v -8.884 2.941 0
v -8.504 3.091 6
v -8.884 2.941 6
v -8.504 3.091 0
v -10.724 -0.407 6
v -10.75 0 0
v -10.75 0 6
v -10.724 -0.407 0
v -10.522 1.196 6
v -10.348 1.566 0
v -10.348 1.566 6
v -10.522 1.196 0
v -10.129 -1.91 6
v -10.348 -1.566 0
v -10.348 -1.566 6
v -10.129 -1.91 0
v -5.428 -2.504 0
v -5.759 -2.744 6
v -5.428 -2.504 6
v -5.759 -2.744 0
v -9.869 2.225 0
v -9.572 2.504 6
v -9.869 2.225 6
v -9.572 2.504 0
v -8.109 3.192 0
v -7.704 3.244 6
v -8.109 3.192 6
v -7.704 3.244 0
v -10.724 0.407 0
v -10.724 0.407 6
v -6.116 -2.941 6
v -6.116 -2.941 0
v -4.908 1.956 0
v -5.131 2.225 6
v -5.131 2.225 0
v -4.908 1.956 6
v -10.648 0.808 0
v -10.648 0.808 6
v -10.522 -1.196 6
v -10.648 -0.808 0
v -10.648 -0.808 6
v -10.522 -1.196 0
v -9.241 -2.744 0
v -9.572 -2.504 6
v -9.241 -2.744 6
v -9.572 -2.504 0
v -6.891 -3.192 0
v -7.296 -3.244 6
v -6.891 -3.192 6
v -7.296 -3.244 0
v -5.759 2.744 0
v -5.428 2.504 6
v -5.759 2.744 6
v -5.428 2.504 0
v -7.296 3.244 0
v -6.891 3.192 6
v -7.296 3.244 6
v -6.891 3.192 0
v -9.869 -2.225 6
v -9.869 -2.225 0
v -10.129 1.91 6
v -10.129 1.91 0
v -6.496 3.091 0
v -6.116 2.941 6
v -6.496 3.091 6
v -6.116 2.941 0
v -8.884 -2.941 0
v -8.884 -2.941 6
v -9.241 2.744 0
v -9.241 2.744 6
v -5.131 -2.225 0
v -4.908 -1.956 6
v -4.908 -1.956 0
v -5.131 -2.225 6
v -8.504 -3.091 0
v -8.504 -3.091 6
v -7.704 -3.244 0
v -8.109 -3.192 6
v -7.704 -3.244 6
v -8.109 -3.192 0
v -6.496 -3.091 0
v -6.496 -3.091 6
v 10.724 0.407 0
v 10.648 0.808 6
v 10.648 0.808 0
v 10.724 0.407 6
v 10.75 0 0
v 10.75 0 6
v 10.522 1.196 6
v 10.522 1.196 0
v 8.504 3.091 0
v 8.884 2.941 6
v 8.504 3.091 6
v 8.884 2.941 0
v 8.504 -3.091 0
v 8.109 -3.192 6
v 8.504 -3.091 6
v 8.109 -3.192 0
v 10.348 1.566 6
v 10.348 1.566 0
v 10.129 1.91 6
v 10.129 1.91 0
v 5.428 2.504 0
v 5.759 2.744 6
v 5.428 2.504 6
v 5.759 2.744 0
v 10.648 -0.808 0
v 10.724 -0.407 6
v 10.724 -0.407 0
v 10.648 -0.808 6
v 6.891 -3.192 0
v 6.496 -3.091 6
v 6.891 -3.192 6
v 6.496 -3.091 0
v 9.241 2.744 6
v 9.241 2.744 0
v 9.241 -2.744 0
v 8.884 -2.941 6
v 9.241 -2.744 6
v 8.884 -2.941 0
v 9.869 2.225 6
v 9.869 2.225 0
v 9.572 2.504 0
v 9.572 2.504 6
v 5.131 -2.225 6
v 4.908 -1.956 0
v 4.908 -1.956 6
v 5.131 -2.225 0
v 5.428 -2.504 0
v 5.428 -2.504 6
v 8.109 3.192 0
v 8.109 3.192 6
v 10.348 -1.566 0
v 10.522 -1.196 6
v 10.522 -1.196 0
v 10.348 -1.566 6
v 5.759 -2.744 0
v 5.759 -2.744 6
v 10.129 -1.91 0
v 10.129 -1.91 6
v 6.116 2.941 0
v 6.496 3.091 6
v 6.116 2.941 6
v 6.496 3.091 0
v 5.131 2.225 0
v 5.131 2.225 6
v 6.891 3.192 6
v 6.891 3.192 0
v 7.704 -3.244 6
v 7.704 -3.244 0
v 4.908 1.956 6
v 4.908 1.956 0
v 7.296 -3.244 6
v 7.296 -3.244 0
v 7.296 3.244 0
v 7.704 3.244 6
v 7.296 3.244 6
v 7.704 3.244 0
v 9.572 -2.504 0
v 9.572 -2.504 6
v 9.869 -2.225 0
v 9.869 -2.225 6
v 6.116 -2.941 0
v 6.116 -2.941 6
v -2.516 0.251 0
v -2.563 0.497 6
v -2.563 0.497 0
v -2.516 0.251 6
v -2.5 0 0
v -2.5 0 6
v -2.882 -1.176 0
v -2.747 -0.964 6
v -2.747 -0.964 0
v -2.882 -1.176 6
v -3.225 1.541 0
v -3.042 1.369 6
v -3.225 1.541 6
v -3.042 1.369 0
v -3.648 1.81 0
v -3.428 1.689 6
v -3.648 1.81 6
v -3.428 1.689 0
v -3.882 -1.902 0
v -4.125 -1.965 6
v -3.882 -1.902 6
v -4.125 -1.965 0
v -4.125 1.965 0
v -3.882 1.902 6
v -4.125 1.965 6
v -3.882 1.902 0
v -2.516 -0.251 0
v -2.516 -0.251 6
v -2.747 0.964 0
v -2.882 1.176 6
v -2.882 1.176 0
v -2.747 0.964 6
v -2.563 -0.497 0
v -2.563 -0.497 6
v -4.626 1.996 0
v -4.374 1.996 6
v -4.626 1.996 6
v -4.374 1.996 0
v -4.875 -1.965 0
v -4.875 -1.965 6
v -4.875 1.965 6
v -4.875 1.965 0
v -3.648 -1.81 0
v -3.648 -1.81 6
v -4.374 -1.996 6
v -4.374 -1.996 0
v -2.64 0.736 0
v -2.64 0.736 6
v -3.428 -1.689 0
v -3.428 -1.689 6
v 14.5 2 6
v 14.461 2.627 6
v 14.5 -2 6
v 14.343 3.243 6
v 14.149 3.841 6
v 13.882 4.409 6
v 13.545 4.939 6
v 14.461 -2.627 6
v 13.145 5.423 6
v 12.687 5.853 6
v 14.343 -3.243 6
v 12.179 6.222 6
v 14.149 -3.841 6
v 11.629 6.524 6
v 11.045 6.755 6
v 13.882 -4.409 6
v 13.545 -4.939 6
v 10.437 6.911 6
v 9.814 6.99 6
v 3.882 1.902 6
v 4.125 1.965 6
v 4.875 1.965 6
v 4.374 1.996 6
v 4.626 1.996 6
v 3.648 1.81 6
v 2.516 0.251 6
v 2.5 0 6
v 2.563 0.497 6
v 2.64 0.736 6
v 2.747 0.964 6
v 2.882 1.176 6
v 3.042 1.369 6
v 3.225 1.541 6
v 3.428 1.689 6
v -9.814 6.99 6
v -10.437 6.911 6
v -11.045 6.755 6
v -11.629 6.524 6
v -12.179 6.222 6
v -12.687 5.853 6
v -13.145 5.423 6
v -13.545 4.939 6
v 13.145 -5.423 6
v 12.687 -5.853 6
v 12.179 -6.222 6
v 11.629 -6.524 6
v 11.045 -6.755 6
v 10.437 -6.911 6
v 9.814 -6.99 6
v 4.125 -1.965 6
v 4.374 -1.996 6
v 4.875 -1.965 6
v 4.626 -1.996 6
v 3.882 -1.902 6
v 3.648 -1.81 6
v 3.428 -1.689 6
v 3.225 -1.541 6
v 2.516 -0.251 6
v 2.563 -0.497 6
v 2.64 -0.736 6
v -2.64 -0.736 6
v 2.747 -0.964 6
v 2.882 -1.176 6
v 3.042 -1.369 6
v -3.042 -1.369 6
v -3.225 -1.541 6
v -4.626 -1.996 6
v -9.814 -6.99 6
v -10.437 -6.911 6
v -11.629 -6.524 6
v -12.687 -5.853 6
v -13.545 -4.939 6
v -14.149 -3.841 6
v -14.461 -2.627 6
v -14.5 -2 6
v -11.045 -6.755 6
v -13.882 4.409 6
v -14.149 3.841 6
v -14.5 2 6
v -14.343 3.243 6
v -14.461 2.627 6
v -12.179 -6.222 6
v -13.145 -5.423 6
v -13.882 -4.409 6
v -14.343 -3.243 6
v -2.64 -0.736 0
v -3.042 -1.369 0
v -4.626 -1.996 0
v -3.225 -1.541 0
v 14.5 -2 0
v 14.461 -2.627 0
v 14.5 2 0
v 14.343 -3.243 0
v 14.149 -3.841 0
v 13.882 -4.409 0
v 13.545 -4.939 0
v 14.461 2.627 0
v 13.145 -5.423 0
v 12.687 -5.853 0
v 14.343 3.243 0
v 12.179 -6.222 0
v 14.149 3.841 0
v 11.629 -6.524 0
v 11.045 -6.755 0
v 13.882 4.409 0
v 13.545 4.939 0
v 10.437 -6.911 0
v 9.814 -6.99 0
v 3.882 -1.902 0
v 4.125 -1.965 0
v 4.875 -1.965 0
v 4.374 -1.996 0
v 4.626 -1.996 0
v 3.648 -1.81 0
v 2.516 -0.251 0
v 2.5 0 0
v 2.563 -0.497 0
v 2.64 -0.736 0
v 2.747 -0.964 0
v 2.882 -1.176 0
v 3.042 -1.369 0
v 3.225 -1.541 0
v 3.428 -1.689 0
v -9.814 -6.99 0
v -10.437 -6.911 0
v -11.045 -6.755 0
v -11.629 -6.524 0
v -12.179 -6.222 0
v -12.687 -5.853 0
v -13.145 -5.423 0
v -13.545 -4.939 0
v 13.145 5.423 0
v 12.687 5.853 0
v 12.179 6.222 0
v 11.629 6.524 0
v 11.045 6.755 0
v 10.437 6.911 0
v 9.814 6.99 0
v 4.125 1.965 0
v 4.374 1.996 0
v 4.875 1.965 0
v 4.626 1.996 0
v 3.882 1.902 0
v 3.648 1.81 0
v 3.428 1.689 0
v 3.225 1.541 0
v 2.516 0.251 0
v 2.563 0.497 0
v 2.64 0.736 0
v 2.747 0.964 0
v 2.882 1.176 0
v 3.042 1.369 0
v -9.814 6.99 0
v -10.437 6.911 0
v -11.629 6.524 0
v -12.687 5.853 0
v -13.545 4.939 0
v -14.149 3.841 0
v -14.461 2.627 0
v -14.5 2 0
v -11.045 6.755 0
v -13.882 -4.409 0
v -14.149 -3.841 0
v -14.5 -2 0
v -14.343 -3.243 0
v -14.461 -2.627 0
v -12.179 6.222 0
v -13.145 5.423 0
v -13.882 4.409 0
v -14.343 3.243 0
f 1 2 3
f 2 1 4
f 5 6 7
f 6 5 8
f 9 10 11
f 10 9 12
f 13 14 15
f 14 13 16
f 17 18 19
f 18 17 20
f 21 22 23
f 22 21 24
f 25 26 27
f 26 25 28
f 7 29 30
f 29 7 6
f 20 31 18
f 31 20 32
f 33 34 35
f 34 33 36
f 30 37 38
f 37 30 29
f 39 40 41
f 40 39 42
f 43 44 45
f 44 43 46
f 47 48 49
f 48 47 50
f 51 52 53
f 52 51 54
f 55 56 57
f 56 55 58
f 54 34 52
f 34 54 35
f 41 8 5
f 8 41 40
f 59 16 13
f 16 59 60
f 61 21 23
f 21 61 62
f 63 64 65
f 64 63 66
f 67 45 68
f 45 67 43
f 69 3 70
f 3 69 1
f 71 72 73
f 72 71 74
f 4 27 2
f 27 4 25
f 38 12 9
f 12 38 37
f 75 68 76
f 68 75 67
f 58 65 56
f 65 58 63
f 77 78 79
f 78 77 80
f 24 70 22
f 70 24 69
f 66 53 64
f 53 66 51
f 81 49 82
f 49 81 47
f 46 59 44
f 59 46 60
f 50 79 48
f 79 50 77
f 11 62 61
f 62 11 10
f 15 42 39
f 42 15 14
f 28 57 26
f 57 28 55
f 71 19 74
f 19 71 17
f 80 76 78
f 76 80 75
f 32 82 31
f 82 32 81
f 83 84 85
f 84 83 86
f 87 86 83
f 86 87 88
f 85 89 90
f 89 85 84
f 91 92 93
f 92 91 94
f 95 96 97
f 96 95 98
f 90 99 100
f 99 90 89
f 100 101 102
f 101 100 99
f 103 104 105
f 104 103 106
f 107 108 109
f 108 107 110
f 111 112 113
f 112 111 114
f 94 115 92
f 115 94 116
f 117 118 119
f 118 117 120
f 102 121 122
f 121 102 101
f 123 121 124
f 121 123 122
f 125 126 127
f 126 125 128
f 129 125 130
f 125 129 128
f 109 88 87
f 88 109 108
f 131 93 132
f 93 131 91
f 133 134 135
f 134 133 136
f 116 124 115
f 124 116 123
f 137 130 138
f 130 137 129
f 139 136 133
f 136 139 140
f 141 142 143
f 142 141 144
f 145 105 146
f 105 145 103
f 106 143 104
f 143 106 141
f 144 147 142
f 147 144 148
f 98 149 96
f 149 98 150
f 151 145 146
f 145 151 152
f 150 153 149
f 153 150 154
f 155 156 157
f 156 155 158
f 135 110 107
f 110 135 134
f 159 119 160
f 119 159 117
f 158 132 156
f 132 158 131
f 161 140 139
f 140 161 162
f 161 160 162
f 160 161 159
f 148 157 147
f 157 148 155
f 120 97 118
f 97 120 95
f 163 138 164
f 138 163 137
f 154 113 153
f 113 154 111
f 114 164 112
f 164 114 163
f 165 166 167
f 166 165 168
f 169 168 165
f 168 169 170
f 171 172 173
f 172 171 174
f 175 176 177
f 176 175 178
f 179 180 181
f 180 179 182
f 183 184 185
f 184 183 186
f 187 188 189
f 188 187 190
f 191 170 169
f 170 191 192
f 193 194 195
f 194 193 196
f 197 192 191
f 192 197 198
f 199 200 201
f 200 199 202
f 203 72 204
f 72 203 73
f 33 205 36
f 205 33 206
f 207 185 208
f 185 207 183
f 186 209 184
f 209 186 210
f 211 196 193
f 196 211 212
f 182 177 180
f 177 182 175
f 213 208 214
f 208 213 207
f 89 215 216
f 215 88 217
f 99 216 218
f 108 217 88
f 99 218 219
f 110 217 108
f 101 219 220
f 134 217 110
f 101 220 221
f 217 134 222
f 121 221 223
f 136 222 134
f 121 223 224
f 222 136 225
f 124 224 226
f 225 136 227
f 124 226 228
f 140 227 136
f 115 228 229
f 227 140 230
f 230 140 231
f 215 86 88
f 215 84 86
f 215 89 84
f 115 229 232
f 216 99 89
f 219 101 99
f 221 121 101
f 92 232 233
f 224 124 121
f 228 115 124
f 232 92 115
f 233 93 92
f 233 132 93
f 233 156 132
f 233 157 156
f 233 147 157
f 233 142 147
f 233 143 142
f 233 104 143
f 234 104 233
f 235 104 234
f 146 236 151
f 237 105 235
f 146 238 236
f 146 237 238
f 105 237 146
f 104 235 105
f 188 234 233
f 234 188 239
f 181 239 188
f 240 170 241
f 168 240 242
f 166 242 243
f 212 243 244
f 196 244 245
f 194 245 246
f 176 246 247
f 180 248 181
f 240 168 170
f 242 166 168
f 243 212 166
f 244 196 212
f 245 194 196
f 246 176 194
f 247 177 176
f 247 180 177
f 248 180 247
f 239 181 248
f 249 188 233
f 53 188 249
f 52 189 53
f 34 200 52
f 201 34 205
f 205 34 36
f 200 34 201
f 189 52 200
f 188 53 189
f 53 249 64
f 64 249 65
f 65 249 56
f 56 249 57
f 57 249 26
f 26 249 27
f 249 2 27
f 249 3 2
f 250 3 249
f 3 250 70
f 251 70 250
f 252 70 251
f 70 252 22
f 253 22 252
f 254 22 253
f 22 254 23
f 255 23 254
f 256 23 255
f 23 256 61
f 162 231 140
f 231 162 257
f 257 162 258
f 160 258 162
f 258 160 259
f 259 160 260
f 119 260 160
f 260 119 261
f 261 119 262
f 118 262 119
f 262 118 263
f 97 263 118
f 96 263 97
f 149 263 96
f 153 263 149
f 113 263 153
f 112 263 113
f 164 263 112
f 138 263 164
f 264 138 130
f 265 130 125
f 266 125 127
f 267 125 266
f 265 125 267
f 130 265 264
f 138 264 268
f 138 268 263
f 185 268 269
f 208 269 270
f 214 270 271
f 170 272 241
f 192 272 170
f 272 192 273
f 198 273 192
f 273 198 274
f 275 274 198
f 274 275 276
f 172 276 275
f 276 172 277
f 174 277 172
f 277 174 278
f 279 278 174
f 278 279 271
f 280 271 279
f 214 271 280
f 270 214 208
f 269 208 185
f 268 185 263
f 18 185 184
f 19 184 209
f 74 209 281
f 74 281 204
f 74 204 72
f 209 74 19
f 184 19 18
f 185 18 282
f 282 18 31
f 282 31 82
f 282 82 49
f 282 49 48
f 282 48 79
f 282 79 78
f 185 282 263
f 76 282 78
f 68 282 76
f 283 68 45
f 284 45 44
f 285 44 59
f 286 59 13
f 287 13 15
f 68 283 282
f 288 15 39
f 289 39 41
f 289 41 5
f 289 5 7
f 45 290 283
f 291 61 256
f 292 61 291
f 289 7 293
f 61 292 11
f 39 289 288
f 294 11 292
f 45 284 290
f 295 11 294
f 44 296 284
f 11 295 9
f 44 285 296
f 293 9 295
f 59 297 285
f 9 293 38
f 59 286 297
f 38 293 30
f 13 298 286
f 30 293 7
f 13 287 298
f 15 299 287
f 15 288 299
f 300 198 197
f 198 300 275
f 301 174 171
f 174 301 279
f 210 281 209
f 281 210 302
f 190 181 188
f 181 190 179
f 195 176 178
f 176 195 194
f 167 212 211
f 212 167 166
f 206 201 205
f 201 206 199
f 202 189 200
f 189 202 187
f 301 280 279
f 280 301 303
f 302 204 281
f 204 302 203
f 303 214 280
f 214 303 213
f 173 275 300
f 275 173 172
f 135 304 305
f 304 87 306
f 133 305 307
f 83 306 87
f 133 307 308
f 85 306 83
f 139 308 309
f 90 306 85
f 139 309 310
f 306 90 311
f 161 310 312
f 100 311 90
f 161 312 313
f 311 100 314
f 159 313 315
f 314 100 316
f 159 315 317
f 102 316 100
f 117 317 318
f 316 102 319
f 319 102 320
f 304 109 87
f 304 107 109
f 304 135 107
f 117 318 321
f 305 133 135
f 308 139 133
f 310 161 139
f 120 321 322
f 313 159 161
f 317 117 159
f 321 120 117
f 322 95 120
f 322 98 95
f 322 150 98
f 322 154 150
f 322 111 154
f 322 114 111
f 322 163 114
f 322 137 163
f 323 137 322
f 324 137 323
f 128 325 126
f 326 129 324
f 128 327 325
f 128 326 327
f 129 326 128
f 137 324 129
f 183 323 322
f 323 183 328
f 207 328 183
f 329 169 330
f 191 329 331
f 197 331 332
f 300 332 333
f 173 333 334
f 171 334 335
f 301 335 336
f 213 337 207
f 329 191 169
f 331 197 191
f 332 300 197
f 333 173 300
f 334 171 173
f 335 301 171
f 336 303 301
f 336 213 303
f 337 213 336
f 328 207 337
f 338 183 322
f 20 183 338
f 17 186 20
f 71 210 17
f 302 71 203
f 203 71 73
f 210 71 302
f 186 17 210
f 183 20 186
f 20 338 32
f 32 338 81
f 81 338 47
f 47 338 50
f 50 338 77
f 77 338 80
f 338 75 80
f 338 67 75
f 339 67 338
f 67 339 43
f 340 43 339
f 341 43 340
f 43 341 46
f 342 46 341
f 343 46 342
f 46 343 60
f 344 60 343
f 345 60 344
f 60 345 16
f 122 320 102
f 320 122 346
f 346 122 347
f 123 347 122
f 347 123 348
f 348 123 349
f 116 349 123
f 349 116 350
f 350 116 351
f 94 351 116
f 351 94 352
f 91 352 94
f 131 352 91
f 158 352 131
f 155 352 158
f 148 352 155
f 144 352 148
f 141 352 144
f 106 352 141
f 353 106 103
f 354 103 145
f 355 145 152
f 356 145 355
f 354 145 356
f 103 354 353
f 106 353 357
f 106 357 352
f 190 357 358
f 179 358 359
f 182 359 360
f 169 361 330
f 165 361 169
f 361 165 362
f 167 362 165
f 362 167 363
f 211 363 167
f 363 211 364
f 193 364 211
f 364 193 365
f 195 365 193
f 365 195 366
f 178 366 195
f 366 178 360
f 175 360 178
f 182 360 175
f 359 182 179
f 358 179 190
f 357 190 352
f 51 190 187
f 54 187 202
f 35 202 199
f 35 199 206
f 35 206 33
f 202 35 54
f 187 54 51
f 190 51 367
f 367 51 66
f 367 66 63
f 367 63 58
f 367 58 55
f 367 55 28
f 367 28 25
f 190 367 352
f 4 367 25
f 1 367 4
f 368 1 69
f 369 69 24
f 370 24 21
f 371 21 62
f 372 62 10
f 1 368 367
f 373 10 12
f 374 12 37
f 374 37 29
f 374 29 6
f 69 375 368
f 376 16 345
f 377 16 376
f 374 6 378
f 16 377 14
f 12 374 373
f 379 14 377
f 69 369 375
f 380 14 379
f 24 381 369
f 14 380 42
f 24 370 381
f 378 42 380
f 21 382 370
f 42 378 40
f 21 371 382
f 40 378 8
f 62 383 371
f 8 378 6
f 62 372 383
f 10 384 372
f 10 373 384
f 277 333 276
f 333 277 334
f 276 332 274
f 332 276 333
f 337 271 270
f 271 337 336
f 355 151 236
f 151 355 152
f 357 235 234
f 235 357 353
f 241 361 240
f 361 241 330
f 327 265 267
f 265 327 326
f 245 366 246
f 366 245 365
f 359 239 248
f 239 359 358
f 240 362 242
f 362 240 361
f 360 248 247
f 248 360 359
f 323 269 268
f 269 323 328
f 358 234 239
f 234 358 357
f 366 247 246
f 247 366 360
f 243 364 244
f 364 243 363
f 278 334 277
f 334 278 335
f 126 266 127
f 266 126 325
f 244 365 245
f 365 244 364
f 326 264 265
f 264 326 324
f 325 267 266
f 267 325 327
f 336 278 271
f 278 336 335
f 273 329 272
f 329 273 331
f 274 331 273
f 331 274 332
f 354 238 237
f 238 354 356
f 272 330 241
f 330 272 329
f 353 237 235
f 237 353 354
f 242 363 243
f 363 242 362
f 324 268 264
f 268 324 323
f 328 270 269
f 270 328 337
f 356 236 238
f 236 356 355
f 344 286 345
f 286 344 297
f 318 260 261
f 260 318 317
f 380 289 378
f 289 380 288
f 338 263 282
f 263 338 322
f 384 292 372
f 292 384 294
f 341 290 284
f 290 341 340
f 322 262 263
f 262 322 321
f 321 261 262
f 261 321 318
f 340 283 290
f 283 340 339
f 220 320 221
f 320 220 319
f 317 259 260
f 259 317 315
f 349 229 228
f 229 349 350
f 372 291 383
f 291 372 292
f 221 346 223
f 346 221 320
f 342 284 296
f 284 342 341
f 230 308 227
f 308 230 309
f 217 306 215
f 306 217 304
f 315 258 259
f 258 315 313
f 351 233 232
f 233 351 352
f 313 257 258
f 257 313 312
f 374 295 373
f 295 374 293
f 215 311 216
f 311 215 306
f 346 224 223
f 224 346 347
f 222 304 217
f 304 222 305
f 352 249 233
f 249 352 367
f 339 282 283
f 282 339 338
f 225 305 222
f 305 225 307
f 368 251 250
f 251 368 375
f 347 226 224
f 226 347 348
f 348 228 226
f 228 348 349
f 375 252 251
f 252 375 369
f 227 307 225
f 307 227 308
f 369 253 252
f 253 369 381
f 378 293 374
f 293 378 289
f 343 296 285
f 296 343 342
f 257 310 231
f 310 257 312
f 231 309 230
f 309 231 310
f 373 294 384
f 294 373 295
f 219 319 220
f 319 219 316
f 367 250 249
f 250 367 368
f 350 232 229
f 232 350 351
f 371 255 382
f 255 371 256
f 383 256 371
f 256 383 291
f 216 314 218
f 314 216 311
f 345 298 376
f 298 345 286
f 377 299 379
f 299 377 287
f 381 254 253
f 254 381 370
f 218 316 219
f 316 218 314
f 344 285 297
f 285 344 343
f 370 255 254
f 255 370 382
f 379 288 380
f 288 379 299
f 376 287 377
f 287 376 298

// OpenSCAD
$fn = 50;


difference() {
	union() {
		hull() {
			translate(v = [-9.5000000000, 2.0000000000, 0]) {
				cylinder(h = 6, r = 5);
			}
			translate(v = [9.5000000000, 2.0000000000, 0]) {
				cylinder(h = 6, r = 5);
			}
			translate(v = [-9.5000000000, -2.0000000000, 0]) {
				cylinder(h = 6, r = 5);
			}
			translate(v = [9.5000000000, -2.0000000000, 0]) {
				cylinder(h = 6, r = 5);
			}
		}
	}
	union() {
		#translate(v = [-7.5000000000, 0.0000000000, -100.0000000000]) {
			cylinder(h = 200, r = 3.2500000000);
		}
		#translate(v = [-7.5000000000, 0.0000000000, -100.0000000000]) {
			cylinder(h = 200, r = 3.2500000000);
		}
		#translate(v = [7.5000000000, 0.0000000000, -100.0000000000]) {
			cylinder(h = 200, r = 3.2500000000);
		}
		#translate(v = [7.5000000000, 0.0000000000, -100.0000000000]) {
			cylinder(h = 200, r = 3.2500000000);
		}
		#translate(v = [-4.5000000000, 0, 0]) {
			cylinder(h = 6, r = 2.0000000000);
		}
		#translate(v = [4.5000000000, 0, 0]) {
			cylinder(h = 6, r = 2.0000000000);
		}
	}
}
